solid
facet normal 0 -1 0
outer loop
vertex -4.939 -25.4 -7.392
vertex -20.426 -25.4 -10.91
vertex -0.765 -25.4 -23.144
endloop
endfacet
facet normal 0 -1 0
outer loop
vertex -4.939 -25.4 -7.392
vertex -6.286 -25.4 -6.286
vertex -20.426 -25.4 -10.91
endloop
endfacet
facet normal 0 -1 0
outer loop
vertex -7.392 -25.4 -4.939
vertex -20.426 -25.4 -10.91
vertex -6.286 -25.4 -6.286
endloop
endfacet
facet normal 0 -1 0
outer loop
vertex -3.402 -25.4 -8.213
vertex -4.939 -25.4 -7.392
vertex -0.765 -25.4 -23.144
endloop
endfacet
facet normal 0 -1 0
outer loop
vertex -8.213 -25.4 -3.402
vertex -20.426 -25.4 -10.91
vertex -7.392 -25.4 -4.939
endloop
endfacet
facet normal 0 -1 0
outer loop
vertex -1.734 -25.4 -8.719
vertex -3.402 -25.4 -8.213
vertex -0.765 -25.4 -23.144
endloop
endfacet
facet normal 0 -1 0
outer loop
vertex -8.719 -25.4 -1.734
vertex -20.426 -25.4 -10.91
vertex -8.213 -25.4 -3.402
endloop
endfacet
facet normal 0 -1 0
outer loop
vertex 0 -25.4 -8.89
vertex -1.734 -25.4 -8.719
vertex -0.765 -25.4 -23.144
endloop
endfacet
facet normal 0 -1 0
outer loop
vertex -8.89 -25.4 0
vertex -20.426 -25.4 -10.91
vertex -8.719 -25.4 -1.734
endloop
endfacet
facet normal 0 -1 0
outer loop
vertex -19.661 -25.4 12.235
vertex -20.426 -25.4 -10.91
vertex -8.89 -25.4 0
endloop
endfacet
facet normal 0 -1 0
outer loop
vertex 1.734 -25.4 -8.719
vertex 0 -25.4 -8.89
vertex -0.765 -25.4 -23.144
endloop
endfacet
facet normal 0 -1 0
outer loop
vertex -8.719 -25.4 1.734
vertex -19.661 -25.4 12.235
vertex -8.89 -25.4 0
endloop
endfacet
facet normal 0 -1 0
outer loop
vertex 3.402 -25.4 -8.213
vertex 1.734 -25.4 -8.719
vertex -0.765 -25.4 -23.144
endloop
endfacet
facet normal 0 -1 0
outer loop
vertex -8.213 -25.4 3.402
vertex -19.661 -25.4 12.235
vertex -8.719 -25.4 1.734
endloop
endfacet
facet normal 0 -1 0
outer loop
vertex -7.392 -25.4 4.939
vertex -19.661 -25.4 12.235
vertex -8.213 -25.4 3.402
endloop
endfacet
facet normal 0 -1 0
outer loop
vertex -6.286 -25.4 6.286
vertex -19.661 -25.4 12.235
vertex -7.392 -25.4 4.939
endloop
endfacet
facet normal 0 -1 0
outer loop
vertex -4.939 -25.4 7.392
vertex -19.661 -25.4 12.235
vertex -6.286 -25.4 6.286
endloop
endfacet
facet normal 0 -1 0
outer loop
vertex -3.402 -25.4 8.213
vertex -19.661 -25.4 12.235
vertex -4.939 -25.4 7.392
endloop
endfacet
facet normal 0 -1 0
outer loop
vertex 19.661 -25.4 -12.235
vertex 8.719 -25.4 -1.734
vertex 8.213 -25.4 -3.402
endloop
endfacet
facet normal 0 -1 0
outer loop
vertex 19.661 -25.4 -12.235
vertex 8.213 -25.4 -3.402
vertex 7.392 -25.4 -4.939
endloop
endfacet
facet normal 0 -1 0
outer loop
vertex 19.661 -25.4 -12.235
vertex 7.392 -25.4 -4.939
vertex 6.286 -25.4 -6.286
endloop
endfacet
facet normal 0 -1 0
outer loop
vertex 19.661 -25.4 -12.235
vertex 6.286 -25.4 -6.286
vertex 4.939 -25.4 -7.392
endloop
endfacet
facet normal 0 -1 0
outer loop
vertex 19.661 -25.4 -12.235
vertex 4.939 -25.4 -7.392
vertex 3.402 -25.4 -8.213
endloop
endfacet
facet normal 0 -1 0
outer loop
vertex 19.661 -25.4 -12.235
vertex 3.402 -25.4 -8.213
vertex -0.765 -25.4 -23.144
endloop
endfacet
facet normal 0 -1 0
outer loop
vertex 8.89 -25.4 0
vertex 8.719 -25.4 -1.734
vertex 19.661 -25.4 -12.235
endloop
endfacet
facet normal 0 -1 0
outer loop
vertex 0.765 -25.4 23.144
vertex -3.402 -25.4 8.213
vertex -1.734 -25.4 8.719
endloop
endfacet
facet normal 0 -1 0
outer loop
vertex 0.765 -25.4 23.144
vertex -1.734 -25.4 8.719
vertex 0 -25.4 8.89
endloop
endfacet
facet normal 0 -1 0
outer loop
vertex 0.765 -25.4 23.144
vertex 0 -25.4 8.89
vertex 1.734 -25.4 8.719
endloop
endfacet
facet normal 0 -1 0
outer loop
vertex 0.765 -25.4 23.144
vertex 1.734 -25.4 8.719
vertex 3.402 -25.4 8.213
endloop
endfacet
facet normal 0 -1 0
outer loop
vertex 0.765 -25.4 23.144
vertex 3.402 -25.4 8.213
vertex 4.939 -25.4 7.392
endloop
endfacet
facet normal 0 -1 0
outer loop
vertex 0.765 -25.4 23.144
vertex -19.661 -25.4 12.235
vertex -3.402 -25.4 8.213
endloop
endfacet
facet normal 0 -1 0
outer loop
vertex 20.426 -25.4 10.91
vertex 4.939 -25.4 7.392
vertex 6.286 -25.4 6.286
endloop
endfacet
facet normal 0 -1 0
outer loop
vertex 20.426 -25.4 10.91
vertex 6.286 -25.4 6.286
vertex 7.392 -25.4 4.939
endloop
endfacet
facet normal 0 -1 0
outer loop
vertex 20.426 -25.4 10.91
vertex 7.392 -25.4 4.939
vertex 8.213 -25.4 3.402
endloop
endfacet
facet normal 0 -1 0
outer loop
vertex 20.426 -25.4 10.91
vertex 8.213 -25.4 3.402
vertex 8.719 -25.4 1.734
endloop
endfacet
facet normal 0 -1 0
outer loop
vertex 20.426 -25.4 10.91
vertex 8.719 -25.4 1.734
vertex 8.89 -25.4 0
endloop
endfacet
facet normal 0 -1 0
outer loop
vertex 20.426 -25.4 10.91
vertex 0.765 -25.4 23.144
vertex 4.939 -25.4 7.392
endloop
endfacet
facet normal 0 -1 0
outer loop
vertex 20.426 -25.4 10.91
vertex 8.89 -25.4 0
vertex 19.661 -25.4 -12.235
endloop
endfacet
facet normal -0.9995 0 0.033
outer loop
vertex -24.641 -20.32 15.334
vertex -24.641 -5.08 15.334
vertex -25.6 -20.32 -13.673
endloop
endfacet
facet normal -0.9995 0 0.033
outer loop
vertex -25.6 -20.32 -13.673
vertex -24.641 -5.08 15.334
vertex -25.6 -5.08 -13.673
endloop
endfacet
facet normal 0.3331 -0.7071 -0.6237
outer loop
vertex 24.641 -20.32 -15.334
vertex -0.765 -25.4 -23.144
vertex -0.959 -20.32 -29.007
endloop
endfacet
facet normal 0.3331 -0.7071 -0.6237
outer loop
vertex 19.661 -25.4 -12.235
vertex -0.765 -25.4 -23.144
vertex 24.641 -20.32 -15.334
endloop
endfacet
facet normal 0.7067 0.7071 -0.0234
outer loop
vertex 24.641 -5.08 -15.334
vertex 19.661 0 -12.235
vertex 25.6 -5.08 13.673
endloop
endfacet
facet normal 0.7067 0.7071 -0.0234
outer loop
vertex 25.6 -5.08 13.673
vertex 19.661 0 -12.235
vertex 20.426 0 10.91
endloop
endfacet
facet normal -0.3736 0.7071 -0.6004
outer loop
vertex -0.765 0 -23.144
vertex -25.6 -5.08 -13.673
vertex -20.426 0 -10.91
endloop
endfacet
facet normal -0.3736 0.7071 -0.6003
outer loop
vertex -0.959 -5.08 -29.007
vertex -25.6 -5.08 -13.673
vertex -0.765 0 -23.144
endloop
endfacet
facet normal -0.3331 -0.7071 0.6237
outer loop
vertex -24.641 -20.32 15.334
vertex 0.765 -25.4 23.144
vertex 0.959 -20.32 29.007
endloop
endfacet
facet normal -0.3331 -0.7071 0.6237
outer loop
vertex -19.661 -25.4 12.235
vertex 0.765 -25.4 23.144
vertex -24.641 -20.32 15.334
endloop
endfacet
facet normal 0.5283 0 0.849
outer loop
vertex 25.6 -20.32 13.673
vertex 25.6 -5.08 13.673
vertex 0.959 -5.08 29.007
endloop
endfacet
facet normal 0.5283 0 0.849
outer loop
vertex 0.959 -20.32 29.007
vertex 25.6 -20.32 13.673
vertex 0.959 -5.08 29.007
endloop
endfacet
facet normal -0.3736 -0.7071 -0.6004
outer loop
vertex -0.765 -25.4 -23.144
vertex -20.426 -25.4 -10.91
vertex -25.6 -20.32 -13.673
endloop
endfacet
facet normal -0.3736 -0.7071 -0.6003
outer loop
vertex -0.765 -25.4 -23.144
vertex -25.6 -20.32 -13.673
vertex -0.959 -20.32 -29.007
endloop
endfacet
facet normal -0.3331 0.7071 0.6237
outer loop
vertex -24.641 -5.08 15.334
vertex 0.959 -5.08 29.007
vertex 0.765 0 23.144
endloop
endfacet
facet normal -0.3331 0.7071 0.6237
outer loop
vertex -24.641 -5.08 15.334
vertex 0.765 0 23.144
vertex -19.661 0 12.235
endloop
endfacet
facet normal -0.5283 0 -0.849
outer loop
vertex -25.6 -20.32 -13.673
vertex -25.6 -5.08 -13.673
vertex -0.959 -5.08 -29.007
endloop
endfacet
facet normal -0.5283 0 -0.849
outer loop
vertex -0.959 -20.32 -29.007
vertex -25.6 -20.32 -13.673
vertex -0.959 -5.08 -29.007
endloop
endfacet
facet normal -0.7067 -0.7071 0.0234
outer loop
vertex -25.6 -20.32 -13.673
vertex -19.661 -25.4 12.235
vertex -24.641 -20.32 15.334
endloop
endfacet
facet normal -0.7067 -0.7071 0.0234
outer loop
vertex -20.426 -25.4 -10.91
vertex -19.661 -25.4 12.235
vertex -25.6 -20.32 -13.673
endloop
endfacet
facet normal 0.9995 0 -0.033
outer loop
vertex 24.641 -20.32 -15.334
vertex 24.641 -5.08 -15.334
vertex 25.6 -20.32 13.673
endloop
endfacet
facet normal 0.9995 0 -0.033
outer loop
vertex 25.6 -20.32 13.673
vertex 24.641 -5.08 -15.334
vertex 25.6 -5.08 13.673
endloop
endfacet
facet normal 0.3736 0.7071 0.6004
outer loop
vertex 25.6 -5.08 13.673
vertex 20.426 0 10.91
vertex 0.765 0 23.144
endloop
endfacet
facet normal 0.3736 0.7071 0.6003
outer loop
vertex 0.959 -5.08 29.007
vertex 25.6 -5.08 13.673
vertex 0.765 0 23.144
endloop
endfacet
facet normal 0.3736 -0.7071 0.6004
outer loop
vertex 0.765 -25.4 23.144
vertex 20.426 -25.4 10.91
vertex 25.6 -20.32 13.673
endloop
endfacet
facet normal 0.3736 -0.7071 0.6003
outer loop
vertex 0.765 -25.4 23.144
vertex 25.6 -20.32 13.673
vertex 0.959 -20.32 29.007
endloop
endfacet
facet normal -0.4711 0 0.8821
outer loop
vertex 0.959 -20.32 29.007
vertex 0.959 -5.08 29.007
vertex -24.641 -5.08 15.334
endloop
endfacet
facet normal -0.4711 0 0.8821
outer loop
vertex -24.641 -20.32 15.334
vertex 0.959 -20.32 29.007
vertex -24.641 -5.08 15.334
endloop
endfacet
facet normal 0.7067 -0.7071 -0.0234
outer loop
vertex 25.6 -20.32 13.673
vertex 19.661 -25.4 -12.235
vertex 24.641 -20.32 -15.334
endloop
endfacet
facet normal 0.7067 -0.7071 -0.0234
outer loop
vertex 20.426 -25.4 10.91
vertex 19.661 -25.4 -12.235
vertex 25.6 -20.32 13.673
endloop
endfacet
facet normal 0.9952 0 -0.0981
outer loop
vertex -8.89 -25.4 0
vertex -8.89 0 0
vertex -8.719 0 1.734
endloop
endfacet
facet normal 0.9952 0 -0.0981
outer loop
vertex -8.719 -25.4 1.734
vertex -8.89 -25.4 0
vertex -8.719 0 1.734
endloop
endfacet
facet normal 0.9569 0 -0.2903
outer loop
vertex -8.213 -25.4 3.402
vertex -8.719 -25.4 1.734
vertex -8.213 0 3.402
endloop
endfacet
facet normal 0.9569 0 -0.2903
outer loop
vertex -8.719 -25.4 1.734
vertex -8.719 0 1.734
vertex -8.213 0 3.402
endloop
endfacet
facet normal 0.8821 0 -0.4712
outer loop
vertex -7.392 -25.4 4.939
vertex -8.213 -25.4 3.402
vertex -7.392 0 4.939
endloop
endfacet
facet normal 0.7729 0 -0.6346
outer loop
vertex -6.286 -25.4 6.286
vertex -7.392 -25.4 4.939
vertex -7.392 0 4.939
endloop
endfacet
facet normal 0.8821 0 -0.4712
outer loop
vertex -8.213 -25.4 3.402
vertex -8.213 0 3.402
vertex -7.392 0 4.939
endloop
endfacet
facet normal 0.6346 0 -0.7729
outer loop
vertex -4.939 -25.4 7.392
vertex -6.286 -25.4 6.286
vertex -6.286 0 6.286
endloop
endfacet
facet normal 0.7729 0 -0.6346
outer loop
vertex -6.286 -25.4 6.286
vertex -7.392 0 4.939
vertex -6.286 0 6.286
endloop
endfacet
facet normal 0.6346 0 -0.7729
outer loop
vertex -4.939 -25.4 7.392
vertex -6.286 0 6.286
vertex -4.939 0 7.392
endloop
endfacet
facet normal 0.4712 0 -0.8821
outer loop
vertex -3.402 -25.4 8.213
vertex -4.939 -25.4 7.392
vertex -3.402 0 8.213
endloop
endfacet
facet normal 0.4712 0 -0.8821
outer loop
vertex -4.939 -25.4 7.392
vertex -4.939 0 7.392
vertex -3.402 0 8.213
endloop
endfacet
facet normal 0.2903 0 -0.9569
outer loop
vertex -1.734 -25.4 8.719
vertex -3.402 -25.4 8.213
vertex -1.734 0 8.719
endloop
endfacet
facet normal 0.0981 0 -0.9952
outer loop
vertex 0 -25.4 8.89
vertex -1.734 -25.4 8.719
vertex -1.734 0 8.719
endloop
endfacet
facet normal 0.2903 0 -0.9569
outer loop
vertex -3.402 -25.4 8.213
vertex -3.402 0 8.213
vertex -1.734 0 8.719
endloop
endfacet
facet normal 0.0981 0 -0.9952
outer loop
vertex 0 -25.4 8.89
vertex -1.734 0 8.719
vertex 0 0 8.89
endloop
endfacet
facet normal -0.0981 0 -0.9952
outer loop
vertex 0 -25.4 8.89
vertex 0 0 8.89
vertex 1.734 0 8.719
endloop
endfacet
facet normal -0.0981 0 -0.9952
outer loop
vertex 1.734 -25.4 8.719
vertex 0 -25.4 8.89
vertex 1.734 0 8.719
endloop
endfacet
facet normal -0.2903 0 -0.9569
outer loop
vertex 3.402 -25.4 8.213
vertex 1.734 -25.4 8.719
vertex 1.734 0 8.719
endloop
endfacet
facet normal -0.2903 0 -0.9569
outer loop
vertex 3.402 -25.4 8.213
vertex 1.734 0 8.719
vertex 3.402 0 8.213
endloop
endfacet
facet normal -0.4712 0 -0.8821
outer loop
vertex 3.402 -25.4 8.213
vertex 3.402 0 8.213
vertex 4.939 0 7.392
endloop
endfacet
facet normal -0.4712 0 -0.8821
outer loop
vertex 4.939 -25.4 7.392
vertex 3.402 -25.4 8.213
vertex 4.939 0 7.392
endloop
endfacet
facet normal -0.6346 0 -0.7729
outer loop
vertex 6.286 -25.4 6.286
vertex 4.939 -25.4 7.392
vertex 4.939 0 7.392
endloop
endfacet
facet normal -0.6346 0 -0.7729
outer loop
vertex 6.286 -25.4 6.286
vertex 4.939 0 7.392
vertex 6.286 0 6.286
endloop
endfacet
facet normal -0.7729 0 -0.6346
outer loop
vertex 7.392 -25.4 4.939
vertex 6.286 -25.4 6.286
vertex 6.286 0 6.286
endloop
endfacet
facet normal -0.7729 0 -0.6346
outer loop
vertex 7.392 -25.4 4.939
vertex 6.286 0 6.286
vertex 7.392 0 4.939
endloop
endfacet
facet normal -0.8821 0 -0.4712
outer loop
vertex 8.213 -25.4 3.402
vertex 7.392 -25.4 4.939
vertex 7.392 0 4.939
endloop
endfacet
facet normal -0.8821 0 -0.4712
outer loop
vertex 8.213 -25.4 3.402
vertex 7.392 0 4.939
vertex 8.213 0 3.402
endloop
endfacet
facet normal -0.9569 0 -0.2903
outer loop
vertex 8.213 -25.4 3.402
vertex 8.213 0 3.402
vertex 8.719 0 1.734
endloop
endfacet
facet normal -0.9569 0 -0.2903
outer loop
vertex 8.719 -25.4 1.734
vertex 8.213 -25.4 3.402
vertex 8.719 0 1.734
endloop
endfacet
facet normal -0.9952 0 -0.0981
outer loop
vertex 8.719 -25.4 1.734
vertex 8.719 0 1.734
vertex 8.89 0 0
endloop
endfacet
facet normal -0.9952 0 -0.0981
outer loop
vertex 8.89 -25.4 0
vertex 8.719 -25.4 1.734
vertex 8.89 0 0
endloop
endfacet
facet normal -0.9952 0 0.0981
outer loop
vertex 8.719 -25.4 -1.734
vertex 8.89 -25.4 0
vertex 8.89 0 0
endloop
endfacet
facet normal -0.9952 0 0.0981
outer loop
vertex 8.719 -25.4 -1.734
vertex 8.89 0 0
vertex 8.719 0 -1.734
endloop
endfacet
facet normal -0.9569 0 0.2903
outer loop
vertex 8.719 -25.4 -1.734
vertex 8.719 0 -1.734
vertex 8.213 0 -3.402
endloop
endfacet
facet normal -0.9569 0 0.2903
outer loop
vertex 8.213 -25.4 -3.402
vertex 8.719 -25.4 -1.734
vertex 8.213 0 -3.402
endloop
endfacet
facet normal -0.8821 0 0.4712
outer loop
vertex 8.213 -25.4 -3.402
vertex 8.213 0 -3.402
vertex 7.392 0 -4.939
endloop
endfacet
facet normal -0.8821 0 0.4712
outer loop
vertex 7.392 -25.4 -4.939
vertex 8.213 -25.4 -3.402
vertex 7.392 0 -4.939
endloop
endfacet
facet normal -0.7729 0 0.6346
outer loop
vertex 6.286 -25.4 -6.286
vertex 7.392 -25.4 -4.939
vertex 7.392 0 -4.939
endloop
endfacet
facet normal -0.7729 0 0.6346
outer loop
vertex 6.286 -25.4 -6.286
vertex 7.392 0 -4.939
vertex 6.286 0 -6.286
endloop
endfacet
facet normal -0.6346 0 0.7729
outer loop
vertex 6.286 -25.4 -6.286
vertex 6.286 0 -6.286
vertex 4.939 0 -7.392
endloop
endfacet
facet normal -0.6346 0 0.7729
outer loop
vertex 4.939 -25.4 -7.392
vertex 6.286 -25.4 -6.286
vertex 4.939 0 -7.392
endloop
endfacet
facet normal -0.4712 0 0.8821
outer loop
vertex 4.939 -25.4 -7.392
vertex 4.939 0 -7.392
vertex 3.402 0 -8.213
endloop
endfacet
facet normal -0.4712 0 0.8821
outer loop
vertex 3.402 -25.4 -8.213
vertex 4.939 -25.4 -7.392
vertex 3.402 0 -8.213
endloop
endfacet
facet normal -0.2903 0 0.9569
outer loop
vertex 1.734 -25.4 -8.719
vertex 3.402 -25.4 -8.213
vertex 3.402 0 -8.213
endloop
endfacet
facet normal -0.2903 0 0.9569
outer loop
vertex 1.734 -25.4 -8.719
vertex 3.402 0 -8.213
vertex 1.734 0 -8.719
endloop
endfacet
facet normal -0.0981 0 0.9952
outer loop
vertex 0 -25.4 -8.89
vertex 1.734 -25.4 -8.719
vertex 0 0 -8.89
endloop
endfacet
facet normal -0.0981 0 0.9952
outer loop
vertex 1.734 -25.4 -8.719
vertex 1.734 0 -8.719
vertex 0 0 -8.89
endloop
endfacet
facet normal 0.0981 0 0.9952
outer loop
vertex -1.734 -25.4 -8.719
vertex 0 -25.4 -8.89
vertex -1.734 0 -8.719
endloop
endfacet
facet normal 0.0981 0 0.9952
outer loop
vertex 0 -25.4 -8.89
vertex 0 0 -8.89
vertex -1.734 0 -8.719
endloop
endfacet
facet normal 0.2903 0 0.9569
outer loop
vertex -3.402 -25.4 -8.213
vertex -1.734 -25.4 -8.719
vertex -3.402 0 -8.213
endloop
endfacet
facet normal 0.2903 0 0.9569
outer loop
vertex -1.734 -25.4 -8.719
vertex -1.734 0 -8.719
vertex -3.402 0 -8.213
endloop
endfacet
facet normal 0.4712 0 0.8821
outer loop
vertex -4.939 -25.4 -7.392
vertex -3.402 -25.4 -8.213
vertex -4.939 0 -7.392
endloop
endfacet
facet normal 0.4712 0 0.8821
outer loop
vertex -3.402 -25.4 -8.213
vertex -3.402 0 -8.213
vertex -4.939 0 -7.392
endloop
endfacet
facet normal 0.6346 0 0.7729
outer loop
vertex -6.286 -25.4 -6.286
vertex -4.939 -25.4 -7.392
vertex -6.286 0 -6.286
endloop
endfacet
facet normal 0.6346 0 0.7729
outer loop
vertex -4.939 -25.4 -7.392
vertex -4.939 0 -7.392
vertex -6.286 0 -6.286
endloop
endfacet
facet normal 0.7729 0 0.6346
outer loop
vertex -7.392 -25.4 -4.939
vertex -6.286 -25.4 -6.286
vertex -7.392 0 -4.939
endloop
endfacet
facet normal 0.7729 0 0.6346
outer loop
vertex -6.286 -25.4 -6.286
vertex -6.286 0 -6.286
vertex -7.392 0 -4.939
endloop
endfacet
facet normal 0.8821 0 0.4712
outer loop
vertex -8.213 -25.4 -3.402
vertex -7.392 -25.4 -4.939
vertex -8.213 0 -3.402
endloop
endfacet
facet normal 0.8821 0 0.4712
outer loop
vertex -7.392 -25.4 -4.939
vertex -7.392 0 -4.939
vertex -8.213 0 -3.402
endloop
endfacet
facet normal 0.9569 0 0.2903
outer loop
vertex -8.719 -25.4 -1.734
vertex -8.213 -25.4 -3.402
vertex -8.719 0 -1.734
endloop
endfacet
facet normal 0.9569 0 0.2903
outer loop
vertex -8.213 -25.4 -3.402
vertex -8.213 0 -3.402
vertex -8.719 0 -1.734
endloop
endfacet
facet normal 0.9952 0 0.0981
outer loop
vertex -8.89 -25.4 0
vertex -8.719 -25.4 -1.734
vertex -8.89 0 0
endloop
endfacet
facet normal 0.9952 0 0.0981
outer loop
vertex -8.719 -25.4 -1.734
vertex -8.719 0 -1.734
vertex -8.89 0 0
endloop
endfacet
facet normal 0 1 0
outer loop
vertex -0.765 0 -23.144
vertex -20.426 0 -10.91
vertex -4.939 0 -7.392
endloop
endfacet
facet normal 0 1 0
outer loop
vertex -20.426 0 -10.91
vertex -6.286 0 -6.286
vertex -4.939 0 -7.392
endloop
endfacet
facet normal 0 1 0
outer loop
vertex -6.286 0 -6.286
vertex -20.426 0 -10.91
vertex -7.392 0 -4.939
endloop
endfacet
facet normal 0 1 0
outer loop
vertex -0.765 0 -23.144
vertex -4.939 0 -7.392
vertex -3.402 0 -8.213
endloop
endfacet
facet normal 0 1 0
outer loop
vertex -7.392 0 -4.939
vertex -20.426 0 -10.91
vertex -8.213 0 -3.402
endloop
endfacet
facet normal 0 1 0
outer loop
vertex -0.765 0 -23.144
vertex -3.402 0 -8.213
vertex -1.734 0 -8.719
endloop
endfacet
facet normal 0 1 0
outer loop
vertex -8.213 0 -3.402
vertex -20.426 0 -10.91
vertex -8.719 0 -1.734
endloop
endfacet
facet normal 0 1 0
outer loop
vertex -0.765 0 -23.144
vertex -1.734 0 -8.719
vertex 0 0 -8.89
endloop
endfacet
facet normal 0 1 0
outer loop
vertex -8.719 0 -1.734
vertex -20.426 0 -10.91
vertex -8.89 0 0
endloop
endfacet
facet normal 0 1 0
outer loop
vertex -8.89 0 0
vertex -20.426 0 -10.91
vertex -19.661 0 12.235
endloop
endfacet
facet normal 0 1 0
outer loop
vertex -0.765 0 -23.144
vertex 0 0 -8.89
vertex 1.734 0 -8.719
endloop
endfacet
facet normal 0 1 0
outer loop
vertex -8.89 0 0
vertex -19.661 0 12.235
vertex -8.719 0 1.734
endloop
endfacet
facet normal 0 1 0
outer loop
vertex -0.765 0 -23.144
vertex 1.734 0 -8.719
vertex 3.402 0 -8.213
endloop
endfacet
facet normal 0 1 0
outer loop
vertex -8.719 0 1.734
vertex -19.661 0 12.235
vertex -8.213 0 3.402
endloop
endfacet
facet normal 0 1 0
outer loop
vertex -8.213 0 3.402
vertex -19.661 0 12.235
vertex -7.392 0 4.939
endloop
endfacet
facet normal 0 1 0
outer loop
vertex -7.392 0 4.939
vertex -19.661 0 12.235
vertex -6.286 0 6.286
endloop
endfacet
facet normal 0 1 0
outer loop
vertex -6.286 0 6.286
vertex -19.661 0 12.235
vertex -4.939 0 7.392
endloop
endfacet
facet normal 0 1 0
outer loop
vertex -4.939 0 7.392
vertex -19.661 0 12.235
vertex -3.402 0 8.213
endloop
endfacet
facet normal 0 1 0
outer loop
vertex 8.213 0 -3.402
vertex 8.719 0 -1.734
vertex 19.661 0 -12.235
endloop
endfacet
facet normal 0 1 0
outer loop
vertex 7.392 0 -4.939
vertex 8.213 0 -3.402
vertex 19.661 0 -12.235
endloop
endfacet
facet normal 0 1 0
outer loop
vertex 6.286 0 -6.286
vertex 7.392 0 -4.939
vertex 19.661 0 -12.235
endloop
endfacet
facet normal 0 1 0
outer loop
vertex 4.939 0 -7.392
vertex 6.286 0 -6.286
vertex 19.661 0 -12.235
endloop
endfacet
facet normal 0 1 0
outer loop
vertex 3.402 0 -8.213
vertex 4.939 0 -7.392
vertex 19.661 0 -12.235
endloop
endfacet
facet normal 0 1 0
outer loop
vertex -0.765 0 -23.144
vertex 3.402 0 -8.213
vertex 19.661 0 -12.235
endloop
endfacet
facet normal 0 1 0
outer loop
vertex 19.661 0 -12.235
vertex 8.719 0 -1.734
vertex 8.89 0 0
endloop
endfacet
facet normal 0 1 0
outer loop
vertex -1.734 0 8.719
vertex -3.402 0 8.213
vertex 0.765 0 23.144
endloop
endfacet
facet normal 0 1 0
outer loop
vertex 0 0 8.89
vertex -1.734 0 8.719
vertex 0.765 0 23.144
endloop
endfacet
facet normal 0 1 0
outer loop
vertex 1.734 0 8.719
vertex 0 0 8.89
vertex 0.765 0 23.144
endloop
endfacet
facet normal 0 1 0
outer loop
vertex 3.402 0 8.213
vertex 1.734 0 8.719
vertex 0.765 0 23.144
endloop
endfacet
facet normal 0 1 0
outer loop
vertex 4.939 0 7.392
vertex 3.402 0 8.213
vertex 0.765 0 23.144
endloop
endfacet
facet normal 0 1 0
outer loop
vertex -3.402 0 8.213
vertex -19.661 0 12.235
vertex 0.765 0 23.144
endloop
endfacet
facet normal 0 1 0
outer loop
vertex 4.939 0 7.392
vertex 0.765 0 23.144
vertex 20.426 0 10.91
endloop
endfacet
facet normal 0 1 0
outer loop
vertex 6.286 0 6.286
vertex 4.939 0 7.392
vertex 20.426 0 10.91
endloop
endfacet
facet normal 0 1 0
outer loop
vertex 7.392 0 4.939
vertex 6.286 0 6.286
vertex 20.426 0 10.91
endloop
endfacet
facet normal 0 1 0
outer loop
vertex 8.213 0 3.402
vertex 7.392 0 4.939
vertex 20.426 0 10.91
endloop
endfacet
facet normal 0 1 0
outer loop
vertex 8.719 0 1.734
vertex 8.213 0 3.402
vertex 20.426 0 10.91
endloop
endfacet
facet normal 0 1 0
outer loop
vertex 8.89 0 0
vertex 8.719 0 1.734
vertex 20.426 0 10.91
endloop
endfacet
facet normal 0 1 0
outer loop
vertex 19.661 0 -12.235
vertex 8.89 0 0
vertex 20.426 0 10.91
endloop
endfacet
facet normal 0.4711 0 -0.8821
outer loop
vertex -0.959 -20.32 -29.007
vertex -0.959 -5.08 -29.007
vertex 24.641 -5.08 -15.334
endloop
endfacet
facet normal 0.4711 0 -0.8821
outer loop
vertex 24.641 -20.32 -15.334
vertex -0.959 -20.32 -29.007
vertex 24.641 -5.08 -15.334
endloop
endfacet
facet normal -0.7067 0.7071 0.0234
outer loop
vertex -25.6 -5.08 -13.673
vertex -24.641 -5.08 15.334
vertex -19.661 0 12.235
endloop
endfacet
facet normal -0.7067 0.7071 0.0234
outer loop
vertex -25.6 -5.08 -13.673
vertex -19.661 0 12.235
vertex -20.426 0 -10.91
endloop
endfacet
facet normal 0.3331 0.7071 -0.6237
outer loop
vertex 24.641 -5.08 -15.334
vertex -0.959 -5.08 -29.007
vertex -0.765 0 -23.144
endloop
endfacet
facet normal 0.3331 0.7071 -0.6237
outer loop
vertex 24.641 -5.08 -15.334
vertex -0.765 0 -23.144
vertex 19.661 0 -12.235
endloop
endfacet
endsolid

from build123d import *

# Parameters (mm, degrees)
F1_DEPTH = 25.4
F2_SIZE  = 5.08
F3_SIZE  = 5.08
F5_D     = 17.78


with BuildPart() as f1:
    # F0 (on Front) → F1 (new body)
    with BuildSketch(Plane.XZ):
        Polygon((25.60047, 13.673016), (0.959056, 29.007166), (-24.641414, 15.33415), (-25.60047, -13.673016), (-0.959056, -29.007166), (24.641414, -15.33415), align=None)
    extrude(amount=F1_DEPTH)

    # F2
    f2_edges = [f1.edges().sort_by_distance(p)[0] for p in [
        (13.279763, -25.4, 21.340091),
        (25.120942, -25.4, -0.830567),
        (11.841179, -25.4, -22.170658),
        (-13.279763, -25.4, -21.340091),
        (-25.120942, -25.4, 0.830567),
        (-11.841179, -25.4, 22.170658),
    ]]
    chamfer(f2_edges, length=F2_SIZE)

    # F3
    f3_edges = [f1.edges().sort_by_distance(p)[0] for p in [
        (25.120942, 0, -0.830567),
        (13.279763, 0, 21.340091),
        (11.841179, 0, -22.170658),
        (-11.841179, 0, 22.170658),
        (-25.120942, 0, 0.830567),
        (-13.279763, 0, -21.340091),
    ]]
    chamfer(f3_edges, length=F3_SIZE)

    # F5 (through all)
    with Locations(Plane.XZ.offset(25.4)):
        with Locations((0, 0)):
            Hole(F5_D / 2)


solid = f1.part
